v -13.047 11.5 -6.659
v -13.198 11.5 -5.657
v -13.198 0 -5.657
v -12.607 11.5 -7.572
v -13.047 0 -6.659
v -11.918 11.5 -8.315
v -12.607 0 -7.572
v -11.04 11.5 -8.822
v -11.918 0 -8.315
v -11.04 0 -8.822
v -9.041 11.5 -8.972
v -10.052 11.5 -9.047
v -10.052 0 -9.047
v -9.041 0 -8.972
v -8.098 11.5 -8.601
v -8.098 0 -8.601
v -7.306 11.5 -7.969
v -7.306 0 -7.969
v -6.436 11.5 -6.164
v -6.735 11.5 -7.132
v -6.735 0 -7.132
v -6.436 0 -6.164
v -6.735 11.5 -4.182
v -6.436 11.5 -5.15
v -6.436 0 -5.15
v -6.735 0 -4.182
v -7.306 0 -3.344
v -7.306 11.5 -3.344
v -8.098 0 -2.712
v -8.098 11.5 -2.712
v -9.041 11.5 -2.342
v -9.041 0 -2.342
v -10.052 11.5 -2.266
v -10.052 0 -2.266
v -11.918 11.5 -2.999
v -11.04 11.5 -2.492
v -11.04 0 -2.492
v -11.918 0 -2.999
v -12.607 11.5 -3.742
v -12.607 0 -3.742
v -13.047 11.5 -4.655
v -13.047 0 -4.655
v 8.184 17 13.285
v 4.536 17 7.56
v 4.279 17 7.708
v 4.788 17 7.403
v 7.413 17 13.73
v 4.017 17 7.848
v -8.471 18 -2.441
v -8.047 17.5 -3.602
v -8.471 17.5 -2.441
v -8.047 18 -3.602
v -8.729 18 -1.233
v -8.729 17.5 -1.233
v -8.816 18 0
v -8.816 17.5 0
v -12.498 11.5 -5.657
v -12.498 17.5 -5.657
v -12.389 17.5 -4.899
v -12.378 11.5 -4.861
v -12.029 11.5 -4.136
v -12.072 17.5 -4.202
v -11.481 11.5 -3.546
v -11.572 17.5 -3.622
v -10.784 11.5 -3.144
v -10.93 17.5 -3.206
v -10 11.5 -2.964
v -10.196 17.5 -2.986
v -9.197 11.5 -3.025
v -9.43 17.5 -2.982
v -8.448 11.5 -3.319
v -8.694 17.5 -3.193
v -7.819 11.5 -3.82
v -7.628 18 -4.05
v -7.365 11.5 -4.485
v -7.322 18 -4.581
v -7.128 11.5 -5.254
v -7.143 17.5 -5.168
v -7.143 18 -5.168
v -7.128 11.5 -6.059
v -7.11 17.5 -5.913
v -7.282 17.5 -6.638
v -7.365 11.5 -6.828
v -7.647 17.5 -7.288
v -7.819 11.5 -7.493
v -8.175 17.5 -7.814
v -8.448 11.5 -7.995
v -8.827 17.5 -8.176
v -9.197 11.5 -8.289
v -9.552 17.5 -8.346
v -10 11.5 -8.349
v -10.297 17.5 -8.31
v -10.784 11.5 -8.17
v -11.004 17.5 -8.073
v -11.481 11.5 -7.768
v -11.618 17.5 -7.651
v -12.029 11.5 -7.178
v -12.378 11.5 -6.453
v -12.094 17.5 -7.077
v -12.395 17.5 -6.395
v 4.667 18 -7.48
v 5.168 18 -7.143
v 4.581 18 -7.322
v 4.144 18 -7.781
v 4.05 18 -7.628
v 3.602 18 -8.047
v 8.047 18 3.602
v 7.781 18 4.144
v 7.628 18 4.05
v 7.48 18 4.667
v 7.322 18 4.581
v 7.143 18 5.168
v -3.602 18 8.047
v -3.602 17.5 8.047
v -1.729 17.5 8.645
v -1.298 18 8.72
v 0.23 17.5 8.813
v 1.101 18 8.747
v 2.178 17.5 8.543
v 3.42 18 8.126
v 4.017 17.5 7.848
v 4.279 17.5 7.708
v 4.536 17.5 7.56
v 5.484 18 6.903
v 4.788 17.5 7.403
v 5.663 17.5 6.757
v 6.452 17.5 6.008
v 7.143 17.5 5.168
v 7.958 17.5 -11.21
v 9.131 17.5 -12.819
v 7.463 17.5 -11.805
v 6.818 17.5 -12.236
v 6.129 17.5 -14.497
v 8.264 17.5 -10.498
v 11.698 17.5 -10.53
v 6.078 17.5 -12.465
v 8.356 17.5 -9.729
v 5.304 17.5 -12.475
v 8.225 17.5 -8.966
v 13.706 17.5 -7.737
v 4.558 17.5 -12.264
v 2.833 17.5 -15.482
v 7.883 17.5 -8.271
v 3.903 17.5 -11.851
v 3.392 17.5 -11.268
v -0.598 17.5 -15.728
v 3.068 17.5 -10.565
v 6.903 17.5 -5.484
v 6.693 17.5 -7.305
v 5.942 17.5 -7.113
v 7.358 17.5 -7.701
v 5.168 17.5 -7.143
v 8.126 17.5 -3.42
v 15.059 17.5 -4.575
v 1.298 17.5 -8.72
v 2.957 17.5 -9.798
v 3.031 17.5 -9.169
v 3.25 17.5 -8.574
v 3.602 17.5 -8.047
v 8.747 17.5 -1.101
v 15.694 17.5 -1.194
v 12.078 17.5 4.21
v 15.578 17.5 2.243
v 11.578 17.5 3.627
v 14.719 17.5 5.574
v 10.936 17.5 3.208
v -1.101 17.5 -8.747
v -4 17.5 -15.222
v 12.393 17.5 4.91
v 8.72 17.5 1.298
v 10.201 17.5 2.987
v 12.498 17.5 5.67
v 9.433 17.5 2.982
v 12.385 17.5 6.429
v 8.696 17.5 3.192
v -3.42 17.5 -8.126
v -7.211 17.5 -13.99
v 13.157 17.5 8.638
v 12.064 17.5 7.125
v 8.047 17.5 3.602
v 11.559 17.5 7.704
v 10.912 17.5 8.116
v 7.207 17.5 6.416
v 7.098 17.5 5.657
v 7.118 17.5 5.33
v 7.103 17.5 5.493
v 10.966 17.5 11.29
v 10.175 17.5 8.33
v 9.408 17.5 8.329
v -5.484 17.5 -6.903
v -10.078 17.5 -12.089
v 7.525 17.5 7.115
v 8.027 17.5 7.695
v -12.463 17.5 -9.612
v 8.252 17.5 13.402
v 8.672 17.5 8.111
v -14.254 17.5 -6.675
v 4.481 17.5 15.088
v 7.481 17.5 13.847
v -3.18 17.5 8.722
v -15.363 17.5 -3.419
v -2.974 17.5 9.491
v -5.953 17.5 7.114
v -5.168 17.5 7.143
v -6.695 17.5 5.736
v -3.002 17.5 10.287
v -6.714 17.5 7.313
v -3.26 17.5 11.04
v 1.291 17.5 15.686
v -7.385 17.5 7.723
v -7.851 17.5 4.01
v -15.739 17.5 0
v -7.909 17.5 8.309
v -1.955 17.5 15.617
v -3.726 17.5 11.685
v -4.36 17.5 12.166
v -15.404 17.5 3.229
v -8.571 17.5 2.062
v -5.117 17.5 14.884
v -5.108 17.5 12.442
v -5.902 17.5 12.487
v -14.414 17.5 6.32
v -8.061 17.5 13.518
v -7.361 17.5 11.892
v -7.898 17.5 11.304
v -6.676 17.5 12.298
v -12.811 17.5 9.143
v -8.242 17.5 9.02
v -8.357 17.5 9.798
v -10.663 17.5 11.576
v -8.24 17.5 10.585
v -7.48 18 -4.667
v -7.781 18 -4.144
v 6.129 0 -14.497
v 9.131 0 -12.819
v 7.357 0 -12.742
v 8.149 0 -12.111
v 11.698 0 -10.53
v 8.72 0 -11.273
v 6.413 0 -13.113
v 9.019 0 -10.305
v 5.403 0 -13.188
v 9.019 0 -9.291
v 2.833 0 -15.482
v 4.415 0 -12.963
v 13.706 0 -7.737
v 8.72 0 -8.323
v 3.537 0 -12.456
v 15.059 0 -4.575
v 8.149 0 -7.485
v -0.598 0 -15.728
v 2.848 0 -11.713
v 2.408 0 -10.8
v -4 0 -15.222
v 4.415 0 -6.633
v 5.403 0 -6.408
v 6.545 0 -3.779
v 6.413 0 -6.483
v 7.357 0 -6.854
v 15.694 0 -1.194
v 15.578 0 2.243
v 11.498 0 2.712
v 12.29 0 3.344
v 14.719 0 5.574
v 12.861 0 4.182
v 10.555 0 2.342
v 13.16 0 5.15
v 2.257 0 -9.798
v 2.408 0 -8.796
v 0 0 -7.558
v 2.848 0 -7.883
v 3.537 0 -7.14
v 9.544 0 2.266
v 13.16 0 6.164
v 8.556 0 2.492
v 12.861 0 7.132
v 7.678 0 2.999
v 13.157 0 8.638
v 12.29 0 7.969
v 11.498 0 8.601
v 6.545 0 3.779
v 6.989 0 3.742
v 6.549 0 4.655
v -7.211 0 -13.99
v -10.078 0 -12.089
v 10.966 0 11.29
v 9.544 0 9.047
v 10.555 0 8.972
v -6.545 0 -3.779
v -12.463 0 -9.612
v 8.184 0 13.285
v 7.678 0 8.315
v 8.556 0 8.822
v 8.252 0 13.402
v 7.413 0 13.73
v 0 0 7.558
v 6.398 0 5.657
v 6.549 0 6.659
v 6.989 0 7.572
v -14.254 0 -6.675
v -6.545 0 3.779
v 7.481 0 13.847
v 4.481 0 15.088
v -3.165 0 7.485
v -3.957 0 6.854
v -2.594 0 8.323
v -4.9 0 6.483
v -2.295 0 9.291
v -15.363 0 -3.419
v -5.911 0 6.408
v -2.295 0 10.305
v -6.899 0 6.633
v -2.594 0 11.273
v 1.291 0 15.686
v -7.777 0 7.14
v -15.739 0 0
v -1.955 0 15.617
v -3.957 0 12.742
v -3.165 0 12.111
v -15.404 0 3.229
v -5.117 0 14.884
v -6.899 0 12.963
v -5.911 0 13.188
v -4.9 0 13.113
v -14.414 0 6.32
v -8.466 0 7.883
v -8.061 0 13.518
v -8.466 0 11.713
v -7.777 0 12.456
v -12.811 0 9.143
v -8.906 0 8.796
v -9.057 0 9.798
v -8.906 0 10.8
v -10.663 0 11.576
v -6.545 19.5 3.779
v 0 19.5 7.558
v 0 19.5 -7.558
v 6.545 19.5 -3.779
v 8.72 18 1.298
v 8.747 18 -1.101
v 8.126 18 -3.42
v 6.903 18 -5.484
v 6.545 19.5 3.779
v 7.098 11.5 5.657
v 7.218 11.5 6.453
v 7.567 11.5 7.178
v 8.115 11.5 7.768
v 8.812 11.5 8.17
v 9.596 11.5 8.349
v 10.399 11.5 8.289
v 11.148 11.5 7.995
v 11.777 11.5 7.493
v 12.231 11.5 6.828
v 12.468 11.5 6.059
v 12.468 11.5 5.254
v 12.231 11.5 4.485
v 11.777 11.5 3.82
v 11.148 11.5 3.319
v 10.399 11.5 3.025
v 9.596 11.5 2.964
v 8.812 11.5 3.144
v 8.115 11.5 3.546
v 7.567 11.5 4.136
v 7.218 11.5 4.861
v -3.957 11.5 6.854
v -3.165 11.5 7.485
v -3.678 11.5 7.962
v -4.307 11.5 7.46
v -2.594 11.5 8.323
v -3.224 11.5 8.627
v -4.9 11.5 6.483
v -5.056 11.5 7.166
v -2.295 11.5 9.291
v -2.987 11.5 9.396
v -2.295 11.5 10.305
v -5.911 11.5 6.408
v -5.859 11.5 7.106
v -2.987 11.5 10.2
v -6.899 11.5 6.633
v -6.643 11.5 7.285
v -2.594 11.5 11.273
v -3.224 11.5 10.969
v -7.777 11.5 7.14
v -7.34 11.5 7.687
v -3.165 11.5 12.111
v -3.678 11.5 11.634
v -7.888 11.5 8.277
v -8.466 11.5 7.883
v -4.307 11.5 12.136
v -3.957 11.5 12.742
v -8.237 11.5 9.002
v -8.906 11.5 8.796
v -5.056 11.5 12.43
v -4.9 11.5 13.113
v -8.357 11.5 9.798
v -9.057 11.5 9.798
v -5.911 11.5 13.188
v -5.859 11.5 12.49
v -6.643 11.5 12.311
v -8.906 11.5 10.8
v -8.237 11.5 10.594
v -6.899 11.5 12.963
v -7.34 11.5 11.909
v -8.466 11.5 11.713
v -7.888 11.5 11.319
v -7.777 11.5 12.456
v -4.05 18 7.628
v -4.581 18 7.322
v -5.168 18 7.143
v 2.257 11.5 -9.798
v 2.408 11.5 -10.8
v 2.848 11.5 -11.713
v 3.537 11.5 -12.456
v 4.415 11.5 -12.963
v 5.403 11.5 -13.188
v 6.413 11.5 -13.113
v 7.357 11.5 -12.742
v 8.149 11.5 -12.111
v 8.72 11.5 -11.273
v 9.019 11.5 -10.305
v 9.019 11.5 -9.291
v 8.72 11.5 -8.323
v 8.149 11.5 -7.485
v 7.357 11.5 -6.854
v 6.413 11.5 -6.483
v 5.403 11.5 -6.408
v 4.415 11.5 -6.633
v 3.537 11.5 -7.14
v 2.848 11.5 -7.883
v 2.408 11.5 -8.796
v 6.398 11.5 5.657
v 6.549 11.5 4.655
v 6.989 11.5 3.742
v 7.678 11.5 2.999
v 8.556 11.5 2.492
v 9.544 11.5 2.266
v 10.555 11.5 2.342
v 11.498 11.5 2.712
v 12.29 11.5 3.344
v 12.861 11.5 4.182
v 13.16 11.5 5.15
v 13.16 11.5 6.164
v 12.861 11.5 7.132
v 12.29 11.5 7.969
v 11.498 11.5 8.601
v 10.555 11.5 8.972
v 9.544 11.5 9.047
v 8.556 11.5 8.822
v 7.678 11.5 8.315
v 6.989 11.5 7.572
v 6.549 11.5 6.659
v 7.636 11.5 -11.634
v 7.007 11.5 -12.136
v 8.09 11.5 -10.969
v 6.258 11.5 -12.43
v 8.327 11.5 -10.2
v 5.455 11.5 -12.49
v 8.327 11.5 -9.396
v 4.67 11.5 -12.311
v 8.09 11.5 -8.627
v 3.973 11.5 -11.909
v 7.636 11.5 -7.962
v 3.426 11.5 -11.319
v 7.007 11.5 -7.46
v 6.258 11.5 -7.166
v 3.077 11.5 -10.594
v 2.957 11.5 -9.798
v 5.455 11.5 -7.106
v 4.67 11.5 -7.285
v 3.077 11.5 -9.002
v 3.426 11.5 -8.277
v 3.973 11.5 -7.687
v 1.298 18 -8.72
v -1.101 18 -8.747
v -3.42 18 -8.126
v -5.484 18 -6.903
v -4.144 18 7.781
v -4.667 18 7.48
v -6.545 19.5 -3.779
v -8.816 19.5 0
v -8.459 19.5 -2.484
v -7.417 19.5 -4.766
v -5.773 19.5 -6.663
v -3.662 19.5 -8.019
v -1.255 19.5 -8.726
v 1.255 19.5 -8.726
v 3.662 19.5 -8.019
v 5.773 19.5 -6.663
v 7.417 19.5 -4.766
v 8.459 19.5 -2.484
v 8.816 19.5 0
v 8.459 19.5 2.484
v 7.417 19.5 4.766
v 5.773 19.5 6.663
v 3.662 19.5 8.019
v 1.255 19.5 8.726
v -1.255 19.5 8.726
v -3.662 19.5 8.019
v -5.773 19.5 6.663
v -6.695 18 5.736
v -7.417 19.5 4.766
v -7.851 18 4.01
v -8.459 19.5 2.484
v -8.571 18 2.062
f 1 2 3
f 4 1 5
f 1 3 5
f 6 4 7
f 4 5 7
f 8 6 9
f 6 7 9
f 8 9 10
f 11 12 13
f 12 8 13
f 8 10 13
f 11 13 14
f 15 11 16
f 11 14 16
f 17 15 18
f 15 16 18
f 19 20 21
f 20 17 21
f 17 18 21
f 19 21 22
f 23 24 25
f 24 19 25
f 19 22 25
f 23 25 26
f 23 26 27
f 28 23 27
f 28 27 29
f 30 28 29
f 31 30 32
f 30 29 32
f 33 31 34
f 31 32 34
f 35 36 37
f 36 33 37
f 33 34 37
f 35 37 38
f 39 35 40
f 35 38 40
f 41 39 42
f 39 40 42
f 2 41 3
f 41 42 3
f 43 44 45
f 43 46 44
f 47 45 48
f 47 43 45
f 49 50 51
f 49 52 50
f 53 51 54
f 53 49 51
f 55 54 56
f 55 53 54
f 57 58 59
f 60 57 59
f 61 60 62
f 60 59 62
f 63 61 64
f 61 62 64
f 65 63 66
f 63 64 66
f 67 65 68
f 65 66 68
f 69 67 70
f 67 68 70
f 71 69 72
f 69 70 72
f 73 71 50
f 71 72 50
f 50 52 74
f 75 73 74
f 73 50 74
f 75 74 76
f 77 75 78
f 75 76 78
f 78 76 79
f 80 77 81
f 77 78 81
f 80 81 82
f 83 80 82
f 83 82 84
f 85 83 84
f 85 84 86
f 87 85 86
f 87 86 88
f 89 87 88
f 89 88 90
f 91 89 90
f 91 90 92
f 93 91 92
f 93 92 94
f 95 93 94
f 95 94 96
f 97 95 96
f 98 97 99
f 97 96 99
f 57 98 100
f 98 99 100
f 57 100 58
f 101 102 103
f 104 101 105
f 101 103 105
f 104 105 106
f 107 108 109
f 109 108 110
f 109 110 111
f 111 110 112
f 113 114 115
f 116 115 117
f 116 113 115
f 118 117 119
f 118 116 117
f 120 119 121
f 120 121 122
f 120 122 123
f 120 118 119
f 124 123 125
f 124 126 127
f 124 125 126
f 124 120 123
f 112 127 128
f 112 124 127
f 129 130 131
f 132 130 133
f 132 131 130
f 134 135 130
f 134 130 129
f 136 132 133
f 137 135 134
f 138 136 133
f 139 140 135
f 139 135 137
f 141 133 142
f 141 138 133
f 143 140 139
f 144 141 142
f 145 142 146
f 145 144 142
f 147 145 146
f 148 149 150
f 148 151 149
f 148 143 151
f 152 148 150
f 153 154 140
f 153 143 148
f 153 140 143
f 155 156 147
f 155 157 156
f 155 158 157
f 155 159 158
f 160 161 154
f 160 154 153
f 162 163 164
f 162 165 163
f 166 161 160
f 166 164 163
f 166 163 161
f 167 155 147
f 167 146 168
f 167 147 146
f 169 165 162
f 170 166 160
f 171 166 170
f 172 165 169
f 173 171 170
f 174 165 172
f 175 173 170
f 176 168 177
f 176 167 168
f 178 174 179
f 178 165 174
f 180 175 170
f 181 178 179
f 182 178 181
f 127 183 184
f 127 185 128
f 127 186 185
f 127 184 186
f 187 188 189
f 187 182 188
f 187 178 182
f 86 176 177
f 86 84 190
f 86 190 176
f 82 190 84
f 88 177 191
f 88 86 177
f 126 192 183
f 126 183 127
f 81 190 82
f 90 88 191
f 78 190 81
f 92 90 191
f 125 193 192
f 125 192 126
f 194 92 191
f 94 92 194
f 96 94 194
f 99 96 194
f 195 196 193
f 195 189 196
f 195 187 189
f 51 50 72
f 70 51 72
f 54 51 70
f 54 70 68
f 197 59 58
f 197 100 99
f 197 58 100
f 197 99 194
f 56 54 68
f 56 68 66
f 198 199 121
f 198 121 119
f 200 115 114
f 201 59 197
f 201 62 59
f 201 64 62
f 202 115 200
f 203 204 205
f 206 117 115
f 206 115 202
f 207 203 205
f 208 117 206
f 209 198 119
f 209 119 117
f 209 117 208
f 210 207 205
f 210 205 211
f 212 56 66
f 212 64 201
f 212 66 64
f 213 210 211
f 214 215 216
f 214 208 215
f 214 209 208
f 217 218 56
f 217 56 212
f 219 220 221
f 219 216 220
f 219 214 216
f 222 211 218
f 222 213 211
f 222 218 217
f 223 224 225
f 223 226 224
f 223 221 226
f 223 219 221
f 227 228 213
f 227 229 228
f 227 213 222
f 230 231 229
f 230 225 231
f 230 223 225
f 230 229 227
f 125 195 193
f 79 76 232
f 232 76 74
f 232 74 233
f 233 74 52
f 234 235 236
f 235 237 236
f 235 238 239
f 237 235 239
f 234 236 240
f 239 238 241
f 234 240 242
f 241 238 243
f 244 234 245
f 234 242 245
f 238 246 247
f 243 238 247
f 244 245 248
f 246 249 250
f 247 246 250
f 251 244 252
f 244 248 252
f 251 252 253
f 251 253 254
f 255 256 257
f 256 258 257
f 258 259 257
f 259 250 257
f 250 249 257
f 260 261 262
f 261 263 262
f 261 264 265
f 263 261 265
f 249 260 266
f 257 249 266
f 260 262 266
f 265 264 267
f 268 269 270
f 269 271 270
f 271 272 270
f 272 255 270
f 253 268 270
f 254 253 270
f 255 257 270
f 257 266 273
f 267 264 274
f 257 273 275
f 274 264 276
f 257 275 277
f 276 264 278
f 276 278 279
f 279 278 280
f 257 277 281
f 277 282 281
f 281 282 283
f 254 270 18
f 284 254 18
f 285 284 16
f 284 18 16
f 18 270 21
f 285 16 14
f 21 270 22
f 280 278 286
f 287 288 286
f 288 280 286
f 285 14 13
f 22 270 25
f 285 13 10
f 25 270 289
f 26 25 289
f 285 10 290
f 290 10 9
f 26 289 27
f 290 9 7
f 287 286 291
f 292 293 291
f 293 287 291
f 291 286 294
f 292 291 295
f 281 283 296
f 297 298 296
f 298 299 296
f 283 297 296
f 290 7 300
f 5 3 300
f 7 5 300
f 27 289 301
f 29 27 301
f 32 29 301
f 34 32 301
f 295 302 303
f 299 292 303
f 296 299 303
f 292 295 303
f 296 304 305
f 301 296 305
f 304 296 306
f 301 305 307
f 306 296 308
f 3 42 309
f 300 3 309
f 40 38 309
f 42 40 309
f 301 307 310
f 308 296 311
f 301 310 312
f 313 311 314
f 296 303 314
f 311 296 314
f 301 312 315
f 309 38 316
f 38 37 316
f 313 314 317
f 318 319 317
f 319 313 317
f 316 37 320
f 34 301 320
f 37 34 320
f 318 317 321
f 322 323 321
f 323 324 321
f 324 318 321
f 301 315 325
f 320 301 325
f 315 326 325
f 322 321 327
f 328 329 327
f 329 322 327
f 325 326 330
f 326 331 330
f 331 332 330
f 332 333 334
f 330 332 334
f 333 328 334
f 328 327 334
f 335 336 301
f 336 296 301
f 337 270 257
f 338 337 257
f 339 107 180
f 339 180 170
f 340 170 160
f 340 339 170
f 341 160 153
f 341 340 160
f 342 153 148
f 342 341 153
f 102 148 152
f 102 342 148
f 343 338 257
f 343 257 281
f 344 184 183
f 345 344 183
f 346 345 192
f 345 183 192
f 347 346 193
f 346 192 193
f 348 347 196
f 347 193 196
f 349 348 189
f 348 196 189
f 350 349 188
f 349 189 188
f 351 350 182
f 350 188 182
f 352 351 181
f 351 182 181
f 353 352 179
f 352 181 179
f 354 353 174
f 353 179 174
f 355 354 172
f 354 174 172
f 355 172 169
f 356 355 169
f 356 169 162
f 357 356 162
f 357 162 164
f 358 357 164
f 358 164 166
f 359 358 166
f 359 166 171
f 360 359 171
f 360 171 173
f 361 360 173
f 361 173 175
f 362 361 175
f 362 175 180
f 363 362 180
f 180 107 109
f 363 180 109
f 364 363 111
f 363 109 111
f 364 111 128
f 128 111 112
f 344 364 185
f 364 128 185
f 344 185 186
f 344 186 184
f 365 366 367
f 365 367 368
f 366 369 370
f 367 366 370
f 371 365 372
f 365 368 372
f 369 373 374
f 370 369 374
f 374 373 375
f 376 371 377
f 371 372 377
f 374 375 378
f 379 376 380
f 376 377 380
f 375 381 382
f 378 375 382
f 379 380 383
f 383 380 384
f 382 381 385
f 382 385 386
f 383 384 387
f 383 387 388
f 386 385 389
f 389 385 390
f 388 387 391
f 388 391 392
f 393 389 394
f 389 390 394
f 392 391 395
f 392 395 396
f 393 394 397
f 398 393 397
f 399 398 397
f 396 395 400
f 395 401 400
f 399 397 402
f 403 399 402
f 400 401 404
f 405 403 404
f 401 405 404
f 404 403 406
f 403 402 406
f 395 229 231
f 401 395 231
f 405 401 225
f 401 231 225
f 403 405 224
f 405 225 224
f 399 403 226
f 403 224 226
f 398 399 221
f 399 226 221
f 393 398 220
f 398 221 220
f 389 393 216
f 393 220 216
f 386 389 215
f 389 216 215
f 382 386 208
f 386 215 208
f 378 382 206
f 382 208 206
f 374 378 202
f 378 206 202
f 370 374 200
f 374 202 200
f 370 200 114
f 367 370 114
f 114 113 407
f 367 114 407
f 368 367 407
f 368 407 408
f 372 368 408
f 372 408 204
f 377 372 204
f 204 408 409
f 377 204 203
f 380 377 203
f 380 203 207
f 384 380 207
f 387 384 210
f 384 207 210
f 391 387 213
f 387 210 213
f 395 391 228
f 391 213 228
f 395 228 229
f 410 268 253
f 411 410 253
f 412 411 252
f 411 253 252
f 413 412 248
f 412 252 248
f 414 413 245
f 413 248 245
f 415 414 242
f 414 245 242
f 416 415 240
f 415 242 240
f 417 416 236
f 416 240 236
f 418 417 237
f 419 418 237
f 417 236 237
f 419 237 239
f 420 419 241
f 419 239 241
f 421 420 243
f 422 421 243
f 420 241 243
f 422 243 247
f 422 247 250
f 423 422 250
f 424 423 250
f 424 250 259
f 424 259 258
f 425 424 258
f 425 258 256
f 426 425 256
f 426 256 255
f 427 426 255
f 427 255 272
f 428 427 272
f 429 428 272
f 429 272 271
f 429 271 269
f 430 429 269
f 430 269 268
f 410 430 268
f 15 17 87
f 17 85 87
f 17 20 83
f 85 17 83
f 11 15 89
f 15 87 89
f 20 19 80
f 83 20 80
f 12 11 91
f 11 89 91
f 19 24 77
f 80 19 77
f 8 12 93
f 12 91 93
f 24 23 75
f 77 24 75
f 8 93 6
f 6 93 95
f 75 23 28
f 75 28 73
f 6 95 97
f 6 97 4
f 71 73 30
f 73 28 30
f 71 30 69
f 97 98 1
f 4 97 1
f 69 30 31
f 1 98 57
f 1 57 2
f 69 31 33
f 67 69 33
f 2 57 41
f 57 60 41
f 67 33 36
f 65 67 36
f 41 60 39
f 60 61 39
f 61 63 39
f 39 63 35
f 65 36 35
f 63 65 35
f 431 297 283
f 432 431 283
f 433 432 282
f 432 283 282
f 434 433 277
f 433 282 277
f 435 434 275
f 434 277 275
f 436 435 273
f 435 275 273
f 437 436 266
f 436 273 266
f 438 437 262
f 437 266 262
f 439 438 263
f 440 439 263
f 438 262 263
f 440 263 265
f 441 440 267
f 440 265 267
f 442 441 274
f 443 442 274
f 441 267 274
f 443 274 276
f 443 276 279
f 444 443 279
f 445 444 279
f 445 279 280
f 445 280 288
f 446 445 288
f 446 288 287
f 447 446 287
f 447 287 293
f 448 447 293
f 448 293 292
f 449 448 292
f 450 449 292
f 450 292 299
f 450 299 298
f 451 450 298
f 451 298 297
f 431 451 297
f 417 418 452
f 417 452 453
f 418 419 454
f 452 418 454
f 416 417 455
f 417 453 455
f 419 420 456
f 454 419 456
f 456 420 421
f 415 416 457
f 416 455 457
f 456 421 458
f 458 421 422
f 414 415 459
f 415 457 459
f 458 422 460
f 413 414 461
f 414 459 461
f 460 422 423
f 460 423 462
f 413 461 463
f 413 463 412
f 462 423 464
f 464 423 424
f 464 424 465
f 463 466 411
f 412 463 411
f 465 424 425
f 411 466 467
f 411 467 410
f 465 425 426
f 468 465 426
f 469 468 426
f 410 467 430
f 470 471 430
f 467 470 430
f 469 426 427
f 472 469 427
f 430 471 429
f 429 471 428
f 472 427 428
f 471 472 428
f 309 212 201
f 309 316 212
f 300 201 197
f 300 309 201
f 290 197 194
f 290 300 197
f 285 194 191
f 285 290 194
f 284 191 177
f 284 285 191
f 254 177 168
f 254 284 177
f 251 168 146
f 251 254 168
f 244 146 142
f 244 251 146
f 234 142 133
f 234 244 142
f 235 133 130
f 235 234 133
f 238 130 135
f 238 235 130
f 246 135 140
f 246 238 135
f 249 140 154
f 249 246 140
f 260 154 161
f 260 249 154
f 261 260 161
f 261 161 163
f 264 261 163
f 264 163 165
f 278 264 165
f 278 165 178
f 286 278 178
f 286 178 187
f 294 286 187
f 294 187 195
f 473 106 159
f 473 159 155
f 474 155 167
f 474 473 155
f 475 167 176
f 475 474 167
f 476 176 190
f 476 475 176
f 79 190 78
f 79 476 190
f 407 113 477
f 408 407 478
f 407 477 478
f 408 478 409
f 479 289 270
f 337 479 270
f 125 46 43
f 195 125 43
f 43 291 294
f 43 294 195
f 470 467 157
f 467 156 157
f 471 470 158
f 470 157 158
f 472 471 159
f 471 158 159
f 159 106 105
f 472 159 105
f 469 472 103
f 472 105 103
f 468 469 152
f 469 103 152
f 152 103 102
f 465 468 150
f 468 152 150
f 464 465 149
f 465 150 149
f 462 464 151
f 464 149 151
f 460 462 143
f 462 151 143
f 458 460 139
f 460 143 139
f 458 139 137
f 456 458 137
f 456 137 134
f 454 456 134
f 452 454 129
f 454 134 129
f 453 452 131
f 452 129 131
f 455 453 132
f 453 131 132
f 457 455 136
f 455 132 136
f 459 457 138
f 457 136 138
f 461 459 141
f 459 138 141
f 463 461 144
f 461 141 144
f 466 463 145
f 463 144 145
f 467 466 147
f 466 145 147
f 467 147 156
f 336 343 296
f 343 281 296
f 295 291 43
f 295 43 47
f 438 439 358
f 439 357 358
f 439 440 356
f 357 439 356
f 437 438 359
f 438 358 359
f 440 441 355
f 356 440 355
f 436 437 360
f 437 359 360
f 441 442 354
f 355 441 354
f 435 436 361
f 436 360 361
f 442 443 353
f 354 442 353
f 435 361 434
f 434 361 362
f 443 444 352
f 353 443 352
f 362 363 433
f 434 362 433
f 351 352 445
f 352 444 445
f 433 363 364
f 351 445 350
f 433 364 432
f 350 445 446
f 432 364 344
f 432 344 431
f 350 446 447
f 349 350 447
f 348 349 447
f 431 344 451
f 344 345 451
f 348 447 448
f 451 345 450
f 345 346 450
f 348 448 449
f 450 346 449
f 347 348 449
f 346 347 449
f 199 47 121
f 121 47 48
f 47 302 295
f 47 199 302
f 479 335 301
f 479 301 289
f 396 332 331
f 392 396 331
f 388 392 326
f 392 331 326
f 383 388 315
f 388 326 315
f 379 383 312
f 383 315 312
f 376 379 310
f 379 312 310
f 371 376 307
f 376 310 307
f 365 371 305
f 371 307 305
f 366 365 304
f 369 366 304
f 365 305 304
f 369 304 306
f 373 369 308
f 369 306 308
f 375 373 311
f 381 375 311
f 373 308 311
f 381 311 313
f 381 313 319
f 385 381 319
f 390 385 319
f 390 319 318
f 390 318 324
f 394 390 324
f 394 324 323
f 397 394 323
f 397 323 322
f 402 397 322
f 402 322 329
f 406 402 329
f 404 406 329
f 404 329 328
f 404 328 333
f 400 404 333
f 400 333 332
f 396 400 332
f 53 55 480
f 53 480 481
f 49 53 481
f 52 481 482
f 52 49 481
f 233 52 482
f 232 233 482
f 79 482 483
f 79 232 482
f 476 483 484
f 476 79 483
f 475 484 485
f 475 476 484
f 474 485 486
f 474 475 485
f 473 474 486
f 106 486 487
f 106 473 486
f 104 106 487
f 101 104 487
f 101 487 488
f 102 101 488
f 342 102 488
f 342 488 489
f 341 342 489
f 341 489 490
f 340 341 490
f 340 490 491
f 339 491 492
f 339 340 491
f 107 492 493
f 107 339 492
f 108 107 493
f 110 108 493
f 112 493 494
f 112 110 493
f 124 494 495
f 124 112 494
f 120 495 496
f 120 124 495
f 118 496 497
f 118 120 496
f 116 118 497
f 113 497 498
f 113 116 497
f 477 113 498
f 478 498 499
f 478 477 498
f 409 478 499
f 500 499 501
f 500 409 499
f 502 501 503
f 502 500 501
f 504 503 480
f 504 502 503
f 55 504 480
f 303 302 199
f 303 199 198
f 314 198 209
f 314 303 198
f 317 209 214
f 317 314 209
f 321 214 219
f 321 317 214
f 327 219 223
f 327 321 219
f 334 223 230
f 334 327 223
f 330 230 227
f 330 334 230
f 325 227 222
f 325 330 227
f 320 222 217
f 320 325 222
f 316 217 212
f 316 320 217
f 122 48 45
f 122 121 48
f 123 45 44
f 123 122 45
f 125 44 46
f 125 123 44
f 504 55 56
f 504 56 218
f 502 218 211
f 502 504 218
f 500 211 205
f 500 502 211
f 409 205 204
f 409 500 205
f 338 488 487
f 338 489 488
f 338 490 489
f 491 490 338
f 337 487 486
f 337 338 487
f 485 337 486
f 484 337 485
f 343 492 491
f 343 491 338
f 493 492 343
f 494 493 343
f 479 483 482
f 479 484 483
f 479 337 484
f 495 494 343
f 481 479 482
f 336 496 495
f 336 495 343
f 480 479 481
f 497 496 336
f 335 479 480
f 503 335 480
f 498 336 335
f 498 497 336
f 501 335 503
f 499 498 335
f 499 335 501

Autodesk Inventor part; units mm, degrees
ref_plane "YZ Plane" through (0, 0, 0) normal (1, 0, 0) x (0, 1, 0)
ref_plane "XZ Plane" through (0, 0, 0) normal (0, 1, 0) x (-1, 0, 0)
sketch "Sketch1" plane through (0, 0, 0) normal (0, 1, 0) x (-1, 0, 0)
  circle A0 centre (9.798, -5.6569) radius 3.4
  circle A1 centre (0, 0) radius 15.739
  line L0 (0, -7.5575) -> (-6.545, -3.7788)
  line L1 (-6.545, -3.7788) -> (-6.545, 3.7788)
  line L2 (-6.545, 3.7788) -> (0, 7.5575)
  line L3 (0, 7.5575) -> (6.545, 3.7788)
  line L4 (6.545, 3.7788) -> (6.545, -3.7788)
  line L5 (6.545, -3.7788) -> (0, -7.5575)
  circle A2 centre (5.6569, 9.798) radius 3.4
  circle A3 centre (-9.798, 5.6569) radius 3.4
  circle A4 centre (-5.6569, -9.798) radius 3.4
  circle A5 centre (5.6569, 9.798) radius 1.86 projected
  circle A6 centre (0, 0) radius 8.8161
  circle A7 centre (5.6569, 9.798) radius 2.7
  circle A8 centre (-9.798, 5.6569) radius 2.7
  circle A9 centre (-5.6569, -9.798) radius 2.7
  circle A10 centre (9.798, -5.6569) radius 2.7
  line L6 (-3.6579, 5.4456) -> (-8.2517, 13.4024)
  line L7 (-8.1837, 13.2847) -> (-7.413, 13.7297)
  line L8 (-7.481, 13.8474) -> (-2.8871, 5.8906)
  line L9 (0.9331, -2.5201) -> (-7.413, 13.7297) construction
  line L10 (-8.2574, 13.3989) -> (1.7159, -2.0681) construction
  point P0 (0, 0)
  point P1 (-3.2725, 5.6681)
  point P2 (-4.0171, 7.8477)
  point P3 (-7.4748, 13.8507)
  point P4 (-8.2577, 13.3988)
  point P5 (-4.7878, 7.4027)
  dimension "d0" = 31.478
  dimension "d3" = 13.09
  dimension "d4" = 6.8
  dimension "d7" = 360
  dimension "d13" = 5.4
  dimension "d16" = 360
extrude "Extrusion1" add sketch "Sketch1" along normal blind 18 contours A0 A6 A2 L8 A1 L6 A3 A4 | A0 A6 A4 A3 L6 L2 L1 L0 L5 L4 L3 L8 A2 | L8 L2 L6 A6 | A6 L6 L7 L8 | L7 L6 A1 L8
ref_plane "Work Plane1" through (-24.2096, 24.4273, -24.2096) normal (0, 1, 0) x (0.0853, 0, 0.9964)
extrude "Extrusion2" add sketch "Sketch1" along normal blind 1.5 from surface at 18 contours A6 A10 A0 | A0 A6 A4 A3 L6 L2 L1 L0 L5 L4 L3 L8 A2 | A6 A10 | A6 A9 A4 | A2 A6 A7 | A6 A9 | A7 A6 | A6 A8 A3 | L8 L2 L6 A6 | A6 A8 picked at (7.7135, -3.2903) picked at (7.577, -4.2584) picked at (-3.2903, -7.7135) picked at (5.035, 6.7062) picked at (-4.2584, -7.577) picked at (4.4327, 7.4764) picked at (-6.8562, 4.5301) picked at (-7.577, 4.2584)
extrude "Extrusion4" add sketch "Sketch1" against normal blind 6.5 from surface at 18 contours A0 A6 A10 | A6 A10 A0 | A6 A9 A4 | A4 A6 A9 | A6 A7 A2 | A2 A6 A7 | A6 A8 A3 | A3 A6 A8
extrude "Extrusion5" cut sketch "Sketch1" against normal blind 0.5 from surface at 18 contours A0 A6 A10 | A0 A6 A2 L8 A1 L6 A3 A4 | A10 A6 | A4 A6 A9 | A6 A7 A2 | A9 A6 | A6 A7 | A3 A6 A8 | A6 L6 L7 L8 | A8 A6 | L7 L6 A1 L8 | A5 picked at (12.9069, -5.176) picked at (10.5068, -6.3265) picked at (-2.5233, -10.0696) picked at (8.7688, 9.3298) picked at (-6.0238, -10.6855) picked at (8.051, 10.0123) picked at (-12.6093, 4.2453) picked at (-10.5428, 6.2692)
extrude "Extrusion6" cut sketch "Sketch1" along normal through all contours L7 L6 A1 L8
extrude "Extrusion7" cut sketch "Sketch1" against normal blind 0.5 from surface at 17.5 contours A6 L6 L7 L8
properties part number "GoBilda Mech Hub 0500 Hex Spacer  inserts V2"
